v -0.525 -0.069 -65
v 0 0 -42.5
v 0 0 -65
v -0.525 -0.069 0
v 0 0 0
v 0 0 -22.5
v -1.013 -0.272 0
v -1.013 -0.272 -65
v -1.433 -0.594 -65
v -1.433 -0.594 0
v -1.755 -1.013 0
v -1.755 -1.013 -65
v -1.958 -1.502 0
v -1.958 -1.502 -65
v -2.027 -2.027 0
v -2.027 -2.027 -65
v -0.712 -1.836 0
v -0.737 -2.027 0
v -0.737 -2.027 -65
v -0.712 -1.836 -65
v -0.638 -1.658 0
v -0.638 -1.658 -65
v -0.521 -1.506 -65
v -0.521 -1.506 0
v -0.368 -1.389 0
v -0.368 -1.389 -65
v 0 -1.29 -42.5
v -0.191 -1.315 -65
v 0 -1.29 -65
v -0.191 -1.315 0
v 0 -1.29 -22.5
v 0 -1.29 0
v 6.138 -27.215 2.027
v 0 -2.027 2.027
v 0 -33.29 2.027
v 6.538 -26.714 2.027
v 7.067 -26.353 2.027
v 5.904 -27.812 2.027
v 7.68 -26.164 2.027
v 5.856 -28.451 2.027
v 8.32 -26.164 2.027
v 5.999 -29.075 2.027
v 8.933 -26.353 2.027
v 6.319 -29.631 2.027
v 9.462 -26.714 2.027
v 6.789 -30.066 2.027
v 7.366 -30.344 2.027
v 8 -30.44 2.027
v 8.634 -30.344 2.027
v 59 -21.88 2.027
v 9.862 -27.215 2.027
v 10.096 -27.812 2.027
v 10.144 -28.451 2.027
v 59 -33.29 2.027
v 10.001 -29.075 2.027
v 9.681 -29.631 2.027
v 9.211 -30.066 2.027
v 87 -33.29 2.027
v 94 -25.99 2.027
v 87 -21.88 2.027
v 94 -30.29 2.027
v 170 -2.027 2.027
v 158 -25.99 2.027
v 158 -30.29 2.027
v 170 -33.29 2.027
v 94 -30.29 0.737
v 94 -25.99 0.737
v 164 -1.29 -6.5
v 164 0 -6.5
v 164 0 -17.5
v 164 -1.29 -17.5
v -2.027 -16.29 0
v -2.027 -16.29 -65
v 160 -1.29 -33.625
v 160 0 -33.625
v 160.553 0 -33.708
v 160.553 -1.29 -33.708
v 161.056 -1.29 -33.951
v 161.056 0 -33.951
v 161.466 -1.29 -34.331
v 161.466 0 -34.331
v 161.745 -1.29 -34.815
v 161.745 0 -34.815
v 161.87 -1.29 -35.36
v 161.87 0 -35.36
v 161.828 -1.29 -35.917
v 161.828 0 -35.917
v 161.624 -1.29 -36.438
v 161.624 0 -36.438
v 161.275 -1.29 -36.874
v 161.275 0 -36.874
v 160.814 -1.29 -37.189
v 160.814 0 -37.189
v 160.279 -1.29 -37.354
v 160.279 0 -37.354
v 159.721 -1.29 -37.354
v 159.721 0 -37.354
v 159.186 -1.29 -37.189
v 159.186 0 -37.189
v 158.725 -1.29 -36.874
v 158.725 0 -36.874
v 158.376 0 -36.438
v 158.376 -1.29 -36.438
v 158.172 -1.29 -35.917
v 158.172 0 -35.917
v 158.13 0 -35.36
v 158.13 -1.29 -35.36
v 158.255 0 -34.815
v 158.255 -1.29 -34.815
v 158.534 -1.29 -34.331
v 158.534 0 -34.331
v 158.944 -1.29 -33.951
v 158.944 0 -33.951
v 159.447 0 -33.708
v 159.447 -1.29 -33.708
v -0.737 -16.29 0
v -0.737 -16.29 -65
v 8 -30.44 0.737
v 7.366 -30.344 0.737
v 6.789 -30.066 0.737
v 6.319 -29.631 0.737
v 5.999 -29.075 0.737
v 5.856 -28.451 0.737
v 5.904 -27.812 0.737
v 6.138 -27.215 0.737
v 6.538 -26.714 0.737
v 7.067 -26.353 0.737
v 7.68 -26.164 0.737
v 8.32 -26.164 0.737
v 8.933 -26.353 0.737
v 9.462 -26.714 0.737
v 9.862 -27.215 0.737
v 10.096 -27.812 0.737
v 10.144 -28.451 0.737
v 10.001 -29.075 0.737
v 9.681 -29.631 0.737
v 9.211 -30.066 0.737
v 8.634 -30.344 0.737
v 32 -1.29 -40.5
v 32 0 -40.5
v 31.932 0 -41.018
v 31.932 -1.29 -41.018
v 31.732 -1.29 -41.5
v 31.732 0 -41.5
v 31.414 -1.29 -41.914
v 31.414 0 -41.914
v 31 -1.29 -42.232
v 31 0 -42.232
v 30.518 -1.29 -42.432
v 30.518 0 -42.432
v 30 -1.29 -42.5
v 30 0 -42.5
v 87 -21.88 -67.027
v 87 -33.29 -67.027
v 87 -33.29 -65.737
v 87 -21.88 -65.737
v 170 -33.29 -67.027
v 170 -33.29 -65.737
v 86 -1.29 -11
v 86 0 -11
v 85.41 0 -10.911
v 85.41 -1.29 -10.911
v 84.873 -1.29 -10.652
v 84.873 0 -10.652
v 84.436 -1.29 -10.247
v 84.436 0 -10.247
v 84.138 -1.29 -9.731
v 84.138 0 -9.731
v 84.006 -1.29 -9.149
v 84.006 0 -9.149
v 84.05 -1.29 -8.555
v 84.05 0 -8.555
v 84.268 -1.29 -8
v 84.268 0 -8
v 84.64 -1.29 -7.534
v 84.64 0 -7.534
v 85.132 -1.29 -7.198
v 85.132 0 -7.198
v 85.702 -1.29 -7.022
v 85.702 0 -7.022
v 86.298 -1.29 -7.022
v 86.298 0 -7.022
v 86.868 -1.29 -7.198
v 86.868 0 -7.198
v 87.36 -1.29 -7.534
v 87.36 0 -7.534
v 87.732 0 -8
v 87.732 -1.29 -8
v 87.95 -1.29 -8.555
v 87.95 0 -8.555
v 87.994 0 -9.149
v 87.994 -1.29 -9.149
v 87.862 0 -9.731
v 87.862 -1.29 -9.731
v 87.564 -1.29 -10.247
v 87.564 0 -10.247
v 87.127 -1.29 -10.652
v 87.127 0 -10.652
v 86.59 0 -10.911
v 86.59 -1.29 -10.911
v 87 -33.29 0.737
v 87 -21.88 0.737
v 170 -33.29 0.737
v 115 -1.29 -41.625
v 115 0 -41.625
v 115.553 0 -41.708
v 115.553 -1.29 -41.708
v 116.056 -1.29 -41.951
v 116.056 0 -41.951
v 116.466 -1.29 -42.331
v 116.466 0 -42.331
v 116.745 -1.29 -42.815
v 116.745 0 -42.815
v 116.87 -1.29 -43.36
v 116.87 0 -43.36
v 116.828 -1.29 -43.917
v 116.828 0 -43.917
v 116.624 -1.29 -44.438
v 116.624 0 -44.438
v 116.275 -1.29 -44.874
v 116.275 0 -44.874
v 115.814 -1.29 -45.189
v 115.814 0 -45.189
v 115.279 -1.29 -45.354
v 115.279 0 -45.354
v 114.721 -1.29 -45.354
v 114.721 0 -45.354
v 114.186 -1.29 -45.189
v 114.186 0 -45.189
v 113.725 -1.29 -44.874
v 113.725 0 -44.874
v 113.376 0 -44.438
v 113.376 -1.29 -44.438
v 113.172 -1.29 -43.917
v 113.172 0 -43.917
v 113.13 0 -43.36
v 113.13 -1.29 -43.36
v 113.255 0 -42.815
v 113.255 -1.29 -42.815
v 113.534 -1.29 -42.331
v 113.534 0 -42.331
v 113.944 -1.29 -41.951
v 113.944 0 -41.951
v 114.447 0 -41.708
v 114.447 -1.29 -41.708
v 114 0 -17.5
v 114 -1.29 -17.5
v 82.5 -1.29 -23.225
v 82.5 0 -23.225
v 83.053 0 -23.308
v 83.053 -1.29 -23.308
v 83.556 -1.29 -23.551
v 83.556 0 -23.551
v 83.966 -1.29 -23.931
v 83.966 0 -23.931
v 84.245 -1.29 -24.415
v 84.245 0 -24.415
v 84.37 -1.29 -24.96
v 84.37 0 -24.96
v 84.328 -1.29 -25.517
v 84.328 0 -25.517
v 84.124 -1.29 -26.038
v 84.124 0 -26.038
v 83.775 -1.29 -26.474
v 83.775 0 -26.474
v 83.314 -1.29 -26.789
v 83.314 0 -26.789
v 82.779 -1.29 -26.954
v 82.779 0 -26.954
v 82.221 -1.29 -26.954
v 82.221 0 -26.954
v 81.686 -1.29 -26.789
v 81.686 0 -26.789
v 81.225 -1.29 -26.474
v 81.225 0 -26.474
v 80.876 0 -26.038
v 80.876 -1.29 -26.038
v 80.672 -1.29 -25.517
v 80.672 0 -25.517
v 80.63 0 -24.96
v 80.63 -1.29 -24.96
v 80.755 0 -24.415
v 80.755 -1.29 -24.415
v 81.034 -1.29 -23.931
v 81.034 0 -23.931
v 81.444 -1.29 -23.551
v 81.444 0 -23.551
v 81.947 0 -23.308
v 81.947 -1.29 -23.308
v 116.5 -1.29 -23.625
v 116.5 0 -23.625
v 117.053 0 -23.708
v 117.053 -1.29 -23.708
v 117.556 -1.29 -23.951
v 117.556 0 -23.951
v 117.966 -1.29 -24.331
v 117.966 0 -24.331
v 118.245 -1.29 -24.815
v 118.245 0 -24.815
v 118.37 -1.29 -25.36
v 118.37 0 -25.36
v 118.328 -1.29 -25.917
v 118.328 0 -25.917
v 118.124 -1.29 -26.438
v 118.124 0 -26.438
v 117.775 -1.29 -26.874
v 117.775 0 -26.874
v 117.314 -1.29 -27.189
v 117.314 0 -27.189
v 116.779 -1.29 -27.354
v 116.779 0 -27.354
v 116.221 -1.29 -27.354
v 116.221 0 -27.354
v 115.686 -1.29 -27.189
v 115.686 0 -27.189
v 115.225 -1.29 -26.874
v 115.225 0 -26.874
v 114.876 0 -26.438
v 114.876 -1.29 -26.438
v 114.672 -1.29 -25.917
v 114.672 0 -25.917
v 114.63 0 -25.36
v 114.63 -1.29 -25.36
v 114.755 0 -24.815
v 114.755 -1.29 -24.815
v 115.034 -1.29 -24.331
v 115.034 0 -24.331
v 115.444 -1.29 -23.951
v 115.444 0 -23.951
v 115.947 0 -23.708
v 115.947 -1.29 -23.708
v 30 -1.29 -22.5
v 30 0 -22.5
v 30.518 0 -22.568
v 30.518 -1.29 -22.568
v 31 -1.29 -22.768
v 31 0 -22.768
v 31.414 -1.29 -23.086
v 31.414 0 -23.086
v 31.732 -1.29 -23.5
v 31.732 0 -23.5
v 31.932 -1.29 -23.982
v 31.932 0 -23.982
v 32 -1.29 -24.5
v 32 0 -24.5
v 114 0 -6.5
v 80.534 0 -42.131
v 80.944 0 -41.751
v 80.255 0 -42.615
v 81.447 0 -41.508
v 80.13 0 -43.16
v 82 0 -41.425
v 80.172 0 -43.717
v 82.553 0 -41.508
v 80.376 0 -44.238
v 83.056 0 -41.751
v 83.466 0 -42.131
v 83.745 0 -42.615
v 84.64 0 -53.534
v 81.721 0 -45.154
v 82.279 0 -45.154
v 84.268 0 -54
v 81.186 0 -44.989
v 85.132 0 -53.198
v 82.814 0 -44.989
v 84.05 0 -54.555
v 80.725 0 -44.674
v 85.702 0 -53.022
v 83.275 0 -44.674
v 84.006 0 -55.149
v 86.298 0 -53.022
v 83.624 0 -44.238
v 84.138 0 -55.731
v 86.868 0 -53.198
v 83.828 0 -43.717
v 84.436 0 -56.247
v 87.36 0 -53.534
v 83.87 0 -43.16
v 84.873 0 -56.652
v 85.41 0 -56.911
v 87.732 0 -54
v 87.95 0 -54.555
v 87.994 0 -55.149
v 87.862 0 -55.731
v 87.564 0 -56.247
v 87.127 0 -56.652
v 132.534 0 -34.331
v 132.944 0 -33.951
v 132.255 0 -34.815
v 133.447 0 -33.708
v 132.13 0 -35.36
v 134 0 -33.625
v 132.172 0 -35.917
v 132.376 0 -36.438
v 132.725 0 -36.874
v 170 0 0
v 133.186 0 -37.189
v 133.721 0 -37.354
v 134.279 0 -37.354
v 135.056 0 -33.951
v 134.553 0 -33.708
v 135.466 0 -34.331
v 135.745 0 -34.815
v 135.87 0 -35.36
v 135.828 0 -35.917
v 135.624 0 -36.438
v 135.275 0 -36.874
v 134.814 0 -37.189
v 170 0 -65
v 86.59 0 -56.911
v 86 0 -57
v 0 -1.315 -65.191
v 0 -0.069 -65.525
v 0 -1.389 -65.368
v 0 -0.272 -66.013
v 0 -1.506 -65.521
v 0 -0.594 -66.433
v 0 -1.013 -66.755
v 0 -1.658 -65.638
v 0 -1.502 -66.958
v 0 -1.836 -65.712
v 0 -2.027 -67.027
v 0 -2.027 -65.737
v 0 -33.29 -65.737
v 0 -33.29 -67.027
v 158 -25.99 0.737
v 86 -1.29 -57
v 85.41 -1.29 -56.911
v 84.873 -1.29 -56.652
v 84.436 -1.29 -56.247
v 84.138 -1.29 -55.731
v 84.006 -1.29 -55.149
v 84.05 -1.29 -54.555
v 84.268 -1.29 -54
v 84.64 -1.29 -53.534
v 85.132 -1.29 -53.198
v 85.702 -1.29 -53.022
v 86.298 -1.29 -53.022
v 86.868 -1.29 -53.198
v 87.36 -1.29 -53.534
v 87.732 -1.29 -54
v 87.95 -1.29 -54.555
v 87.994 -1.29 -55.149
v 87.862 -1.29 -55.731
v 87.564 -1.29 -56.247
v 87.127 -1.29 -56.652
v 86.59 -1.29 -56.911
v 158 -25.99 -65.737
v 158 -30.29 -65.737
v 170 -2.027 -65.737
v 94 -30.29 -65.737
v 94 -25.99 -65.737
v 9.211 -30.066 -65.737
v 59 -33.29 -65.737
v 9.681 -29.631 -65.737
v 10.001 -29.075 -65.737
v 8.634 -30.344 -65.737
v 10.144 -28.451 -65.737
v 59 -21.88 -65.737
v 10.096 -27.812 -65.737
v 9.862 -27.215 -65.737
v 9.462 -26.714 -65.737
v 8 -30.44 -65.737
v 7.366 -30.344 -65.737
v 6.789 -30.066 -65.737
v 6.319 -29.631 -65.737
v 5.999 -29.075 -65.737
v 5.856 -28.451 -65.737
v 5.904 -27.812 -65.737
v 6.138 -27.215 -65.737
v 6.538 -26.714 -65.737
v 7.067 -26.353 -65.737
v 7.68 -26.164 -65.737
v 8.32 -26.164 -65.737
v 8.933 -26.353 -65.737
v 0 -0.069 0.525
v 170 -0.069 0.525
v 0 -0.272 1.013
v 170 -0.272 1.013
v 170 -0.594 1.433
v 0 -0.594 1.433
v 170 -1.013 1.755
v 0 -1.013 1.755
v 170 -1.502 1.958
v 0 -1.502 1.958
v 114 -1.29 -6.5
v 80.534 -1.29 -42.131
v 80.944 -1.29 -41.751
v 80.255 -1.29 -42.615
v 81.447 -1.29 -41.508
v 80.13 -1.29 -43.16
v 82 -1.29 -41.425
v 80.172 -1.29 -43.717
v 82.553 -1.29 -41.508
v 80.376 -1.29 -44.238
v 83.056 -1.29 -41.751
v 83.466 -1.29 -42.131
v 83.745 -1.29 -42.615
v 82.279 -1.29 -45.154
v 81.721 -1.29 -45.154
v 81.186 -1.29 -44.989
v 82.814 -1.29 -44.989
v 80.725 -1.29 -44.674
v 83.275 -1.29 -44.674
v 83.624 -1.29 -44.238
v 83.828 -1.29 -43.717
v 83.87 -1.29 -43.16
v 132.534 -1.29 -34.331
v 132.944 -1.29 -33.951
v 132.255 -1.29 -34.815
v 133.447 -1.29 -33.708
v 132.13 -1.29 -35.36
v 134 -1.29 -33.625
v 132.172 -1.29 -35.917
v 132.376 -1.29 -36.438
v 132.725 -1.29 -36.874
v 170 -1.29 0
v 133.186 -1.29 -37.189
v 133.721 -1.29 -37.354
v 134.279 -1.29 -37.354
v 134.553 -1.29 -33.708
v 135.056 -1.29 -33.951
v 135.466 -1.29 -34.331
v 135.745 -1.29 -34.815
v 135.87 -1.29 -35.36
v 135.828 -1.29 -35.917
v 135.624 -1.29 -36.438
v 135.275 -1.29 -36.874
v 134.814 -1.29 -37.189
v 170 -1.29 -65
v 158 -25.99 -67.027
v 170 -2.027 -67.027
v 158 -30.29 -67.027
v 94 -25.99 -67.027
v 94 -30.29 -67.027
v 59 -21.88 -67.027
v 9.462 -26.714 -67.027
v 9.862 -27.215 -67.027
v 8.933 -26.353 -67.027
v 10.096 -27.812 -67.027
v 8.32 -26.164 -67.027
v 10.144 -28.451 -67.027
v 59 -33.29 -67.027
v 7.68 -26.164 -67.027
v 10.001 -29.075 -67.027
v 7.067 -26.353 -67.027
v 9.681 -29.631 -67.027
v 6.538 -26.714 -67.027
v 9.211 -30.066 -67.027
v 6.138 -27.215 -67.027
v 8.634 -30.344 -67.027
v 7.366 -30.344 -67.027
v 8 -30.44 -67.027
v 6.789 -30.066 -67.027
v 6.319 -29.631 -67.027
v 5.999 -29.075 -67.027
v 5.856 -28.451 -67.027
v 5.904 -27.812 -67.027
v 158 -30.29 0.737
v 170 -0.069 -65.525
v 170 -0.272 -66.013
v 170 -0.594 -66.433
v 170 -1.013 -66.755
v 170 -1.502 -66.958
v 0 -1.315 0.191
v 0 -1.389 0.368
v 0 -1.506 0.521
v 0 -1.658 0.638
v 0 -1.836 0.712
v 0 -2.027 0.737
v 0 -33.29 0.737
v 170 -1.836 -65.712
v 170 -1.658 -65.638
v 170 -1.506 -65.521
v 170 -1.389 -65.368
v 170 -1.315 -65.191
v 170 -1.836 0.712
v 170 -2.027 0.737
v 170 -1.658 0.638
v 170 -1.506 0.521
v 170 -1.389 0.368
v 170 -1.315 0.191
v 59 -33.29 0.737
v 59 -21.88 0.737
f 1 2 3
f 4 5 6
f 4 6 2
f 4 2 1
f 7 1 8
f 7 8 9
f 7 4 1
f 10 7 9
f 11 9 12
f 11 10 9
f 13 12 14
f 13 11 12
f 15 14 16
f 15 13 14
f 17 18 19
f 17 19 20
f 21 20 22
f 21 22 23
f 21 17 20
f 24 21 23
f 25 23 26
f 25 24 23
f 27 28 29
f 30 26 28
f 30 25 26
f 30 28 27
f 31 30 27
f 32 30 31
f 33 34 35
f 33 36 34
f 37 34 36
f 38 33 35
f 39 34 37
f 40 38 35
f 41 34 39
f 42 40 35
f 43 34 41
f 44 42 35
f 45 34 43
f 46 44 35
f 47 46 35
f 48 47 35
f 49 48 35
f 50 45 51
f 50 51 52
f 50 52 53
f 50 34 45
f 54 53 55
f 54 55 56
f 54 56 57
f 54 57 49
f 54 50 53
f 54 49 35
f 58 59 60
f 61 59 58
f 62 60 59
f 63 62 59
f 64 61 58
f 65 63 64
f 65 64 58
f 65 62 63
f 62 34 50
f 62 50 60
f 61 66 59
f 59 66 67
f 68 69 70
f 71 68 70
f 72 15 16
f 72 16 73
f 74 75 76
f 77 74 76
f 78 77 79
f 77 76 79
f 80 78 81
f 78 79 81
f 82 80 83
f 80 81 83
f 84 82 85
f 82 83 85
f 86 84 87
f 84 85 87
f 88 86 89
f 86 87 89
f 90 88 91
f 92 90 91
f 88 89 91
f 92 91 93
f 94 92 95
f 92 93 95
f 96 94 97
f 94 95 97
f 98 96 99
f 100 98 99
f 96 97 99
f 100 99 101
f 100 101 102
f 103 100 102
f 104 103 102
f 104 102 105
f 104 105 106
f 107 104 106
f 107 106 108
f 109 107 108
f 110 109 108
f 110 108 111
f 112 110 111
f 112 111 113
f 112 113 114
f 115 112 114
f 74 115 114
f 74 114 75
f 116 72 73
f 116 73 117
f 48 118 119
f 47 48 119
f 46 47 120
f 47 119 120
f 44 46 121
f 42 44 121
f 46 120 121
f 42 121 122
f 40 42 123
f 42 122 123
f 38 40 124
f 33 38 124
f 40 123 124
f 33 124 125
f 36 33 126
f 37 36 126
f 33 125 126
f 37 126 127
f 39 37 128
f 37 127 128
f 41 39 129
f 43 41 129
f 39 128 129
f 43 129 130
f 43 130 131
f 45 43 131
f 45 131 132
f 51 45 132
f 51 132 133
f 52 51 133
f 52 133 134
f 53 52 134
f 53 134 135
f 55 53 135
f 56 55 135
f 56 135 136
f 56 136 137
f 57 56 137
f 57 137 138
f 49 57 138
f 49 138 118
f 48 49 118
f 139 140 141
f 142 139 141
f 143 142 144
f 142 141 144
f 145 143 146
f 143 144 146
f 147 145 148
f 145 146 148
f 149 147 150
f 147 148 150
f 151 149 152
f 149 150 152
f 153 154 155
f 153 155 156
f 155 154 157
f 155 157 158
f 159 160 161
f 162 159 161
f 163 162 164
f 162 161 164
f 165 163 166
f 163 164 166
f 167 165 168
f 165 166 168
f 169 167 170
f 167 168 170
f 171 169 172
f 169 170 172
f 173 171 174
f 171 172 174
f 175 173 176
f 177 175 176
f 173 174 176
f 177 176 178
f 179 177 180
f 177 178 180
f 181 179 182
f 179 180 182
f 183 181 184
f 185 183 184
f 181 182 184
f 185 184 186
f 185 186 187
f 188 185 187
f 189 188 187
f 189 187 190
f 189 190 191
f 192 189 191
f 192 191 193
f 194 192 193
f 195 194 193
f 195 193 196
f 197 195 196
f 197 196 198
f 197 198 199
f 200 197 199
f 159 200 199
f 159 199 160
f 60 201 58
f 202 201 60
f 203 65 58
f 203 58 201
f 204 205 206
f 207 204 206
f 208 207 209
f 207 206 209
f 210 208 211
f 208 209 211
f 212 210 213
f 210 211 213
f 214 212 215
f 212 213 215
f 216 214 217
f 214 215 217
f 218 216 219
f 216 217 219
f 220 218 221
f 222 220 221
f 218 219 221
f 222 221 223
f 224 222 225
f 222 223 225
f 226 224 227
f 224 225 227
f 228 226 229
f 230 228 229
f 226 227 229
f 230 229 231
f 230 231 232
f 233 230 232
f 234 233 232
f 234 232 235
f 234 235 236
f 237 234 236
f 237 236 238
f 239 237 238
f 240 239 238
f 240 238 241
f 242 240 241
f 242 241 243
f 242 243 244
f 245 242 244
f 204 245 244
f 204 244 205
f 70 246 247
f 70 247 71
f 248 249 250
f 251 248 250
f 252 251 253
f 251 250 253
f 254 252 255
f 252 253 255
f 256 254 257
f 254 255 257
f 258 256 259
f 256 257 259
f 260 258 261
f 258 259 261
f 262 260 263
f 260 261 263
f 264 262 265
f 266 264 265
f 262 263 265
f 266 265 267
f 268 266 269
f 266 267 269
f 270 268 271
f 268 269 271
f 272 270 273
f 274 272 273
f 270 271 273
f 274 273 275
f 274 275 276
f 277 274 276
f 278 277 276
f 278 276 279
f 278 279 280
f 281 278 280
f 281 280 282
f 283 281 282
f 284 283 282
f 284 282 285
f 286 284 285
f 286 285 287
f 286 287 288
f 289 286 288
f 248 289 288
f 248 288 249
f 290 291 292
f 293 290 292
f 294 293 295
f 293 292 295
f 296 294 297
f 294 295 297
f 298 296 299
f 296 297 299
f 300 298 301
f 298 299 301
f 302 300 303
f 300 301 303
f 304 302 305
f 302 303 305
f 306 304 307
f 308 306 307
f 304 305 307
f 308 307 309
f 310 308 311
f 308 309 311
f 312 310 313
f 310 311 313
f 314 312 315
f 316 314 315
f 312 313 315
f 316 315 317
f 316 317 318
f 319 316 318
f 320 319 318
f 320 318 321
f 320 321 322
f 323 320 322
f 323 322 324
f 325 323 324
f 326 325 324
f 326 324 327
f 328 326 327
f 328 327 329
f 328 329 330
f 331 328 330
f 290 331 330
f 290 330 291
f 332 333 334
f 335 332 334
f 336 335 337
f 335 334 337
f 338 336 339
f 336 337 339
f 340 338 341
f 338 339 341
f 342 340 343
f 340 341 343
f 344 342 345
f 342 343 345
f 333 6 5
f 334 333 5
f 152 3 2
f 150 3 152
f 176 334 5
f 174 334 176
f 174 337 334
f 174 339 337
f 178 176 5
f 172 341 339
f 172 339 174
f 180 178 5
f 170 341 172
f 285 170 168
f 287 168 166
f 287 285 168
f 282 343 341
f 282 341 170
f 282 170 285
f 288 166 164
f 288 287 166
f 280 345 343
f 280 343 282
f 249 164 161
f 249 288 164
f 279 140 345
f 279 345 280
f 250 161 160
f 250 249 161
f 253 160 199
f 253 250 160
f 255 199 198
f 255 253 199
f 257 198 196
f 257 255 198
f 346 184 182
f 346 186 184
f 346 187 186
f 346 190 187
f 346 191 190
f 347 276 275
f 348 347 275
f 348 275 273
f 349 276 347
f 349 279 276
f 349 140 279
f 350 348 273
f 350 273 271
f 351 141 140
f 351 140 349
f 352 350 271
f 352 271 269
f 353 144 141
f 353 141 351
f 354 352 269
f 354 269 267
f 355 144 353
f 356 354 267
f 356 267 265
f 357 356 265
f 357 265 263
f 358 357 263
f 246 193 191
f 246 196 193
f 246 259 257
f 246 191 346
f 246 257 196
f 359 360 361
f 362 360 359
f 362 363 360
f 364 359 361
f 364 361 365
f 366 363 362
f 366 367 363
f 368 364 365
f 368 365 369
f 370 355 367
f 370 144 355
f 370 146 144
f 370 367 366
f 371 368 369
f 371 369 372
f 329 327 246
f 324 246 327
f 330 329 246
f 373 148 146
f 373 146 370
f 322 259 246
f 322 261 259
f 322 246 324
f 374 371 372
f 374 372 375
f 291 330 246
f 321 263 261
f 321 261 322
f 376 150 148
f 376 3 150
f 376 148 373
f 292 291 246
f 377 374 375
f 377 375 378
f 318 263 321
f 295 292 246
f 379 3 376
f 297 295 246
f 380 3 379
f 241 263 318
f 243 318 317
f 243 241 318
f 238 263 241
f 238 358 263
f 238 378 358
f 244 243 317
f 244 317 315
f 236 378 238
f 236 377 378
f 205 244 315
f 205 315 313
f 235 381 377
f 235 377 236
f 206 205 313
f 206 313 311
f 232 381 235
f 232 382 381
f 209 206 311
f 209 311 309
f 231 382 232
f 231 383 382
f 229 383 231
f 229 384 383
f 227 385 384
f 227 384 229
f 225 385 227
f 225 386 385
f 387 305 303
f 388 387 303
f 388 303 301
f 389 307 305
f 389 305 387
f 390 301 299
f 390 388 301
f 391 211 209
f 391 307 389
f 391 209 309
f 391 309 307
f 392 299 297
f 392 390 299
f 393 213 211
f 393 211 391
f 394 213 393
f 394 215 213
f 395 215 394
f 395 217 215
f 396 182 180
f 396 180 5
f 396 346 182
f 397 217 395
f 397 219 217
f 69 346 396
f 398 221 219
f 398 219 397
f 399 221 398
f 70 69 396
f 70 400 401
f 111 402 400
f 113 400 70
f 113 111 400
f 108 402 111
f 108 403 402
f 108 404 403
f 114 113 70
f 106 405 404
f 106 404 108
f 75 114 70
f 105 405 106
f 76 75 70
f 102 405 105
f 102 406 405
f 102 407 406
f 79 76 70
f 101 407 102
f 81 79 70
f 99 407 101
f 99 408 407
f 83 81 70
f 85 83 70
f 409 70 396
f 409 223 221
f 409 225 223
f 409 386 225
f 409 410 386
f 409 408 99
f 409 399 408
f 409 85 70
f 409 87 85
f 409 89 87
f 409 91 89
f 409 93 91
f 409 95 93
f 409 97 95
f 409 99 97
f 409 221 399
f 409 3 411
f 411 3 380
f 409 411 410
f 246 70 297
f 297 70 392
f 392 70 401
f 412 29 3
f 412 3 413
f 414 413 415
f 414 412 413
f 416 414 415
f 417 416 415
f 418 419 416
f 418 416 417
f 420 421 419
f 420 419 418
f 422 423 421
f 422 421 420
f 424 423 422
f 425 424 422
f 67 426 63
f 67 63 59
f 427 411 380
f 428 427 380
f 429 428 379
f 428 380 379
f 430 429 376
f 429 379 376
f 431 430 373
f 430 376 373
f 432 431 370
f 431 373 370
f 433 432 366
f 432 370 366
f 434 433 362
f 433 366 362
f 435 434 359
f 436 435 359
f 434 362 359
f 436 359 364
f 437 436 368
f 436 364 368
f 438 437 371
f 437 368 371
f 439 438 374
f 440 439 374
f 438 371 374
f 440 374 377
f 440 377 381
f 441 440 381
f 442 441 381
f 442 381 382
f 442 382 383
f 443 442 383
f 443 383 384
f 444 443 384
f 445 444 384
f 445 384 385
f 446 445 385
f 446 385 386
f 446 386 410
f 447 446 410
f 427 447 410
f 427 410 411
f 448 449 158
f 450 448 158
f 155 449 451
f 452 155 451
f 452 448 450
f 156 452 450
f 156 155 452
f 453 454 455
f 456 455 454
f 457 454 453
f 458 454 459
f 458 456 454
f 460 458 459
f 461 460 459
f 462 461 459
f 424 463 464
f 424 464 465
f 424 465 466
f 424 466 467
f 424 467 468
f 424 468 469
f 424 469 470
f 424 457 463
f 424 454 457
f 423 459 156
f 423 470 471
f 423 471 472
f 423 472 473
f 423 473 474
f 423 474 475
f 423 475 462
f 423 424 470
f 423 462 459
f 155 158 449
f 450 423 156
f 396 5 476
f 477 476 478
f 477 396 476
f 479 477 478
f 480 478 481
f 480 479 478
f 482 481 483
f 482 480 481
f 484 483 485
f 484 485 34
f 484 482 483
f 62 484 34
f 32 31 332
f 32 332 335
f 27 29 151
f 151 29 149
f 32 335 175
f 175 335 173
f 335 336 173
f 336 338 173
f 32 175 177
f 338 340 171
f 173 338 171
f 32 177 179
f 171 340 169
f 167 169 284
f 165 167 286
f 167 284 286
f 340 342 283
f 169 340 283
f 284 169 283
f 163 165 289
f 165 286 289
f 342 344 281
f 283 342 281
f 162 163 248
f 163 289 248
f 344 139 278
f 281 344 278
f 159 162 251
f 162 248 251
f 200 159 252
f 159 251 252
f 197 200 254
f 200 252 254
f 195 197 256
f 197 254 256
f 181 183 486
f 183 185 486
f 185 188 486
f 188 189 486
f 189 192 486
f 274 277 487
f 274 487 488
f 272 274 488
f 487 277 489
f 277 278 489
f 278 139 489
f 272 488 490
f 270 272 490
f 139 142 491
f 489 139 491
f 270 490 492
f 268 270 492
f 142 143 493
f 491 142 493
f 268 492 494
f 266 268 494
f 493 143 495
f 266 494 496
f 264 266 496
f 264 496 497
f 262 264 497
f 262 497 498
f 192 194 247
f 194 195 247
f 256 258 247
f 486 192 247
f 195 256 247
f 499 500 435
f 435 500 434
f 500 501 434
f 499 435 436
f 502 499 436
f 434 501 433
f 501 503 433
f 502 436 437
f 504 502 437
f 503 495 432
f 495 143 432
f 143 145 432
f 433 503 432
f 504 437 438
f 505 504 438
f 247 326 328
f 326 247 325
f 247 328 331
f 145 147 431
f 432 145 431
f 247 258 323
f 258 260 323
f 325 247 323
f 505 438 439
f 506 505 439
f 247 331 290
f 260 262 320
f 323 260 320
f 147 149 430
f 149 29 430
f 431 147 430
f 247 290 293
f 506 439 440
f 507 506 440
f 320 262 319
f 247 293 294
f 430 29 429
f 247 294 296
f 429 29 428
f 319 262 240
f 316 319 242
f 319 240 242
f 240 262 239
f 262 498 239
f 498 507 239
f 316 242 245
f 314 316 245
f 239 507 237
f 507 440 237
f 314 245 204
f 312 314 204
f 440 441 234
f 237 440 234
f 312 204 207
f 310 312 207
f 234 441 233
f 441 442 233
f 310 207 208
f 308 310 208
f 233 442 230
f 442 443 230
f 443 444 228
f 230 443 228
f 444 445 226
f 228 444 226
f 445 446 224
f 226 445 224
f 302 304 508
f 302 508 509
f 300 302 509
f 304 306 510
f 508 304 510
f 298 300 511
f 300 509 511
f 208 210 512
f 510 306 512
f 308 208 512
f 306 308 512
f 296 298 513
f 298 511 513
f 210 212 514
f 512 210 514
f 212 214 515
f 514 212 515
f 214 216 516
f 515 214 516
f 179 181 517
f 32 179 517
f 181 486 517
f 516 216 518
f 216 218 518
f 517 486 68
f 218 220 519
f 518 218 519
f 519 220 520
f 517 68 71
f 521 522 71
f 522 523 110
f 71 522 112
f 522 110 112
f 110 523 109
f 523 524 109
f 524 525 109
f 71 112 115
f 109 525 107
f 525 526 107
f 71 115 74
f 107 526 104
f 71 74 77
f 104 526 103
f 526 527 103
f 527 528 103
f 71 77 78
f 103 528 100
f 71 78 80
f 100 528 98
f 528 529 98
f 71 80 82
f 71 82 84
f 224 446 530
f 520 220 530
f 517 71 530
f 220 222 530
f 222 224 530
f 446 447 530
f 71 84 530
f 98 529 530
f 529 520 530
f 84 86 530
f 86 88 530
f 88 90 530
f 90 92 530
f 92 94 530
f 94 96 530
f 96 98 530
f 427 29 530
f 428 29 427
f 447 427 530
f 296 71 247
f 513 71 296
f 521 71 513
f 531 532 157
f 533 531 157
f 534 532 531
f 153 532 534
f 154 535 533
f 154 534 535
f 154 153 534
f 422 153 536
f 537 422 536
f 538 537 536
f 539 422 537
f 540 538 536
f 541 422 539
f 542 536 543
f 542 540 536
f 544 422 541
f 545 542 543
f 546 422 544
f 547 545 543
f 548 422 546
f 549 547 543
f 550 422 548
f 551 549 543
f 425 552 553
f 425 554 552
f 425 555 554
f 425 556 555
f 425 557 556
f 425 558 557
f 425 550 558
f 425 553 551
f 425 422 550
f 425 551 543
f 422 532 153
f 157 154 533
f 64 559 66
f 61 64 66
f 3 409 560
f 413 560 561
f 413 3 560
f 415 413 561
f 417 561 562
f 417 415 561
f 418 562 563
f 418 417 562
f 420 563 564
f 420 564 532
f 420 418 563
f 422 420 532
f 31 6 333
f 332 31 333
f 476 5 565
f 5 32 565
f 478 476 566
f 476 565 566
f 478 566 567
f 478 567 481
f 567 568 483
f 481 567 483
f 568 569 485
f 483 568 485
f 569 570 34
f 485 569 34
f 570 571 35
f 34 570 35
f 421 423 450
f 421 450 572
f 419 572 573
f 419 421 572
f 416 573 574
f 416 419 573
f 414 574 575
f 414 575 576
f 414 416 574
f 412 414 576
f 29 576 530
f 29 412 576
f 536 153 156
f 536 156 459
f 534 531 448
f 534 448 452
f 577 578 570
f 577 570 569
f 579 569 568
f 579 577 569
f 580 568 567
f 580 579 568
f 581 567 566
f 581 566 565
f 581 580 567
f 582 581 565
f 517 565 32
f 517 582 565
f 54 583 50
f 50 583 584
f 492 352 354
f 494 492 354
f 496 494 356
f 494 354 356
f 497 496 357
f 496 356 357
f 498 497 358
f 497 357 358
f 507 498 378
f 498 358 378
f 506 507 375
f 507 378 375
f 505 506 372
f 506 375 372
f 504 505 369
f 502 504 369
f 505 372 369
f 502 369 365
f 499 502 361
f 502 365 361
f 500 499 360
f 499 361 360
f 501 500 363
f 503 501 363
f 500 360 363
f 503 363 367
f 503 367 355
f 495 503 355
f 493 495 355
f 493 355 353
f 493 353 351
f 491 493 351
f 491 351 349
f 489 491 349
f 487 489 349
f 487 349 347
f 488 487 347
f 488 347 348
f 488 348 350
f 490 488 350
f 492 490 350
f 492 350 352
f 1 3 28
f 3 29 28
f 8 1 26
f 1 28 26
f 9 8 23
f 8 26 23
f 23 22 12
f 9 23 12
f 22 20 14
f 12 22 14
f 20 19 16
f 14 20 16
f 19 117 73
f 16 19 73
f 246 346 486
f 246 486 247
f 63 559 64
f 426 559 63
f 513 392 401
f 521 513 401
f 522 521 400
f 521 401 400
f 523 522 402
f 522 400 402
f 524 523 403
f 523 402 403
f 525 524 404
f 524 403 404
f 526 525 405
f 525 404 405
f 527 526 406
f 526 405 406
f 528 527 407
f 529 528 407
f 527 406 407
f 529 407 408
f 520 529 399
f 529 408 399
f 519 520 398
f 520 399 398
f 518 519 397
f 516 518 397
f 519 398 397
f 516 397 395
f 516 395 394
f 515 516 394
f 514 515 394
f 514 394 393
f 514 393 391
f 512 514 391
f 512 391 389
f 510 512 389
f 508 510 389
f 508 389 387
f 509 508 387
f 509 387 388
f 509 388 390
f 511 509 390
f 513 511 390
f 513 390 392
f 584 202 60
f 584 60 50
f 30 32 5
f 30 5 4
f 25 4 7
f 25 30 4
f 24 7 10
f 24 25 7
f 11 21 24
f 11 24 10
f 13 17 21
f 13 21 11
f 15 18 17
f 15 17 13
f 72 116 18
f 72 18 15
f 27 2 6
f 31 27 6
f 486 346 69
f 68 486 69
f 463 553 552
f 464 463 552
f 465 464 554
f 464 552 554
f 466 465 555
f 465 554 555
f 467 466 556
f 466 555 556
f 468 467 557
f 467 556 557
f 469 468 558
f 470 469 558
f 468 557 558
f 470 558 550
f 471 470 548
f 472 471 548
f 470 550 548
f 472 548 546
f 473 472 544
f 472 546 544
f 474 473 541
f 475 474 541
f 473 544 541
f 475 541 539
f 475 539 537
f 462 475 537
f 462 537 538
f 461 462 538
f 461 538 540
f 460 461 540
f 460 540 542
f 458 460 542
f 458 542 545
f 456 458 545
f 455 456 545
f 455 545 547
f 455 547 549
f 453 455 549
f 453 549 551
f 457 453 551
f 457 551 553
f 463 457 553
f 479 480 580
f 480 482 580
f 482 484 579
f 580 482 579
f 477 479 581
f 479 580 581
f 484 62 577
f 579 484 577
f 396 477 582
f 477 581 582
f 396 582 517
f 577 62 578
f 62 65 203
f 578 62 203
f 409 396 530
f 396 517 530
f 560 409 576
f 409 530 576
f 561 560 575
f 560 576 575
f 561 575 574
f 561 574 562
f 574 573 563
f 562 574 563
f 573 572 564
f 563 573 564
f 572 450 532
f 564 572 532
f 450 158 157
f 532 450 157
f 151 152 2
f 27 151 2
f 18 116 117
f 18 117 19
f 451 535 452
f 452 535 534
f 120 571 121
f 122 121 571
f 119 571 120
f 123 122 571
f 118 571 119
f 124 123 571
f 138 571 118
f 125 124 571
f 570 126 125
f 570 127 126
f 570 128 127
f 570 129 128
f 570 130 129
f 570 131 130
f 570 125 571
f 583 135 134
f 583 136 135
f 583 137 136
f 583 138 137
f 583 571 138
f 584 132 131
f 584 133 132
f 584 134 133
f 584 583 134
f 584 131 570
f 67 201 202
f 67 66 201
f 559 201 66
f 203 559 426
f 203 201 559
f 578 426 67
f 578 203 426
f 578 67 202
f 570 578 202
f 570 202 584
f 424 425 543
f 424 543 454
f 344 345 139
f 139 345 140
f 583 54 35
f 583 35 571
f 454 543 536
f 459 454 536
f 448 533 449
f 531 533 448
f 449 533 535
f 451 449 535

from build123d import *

# Parameters (mm, degrees)
SKETCH1_W          = 170
SKETCH1_H          = 65
BASE_FLANGE1_DEPTH = 1.29
EDGE_FLANGE1_DEPTH = 170
EDGE_FLANGE3_DEPTH = 65
CUT_EXTRUDE1_REACH = 187.022
SKETCH16_R         = 2
SKETCH16_W         = 50
SKETCH16_H         = 11
EDGE_FLANGE7_DEPTH = 170
SKETCH34_R         = 2.15
SKETCH34_W         = 28
SKETCH34_H         = 11.41
SKETCH34_W_2       = 64
SKETCH34_H_2       = 4.3
CUT_EXTRUDE5_DEPTH = 187.484767556
SKETCH36_R         = 1.875
CUT_EXTRUDE6_DEPTH = 10
SKETCH37_R         = 1.875
CUT_EXTRUDE7_DEPTH = 10


# Sheet-metal steps are written as plain solids
with BuildPart() as part:
    # Sketch1 → Base-Flange1 (new body)
    with BuildSketch(Plane(origin=(0, 0, 0), x_dir=(1, 0, 0), z_dir=(0, 1, 0))):
        with Locations((85, 32.5)):
            Rectangle(SKETCH1_W, SKETCH1_H)
    extrude(amount=-BASE_FLANGE1_DEPTH)

    # Edge-Flange1 section (across the edge) → Edge-Flange1 (add)
    with BuildSketch(Plane(origin=(170, -1.29, 0.7366), x_dir=(0, 0, -1), z_dir=(-1, 0, 0))):
        with BuildLine():
            Line((-1.29, 0.7366), (-1.29, 32))
            Line((-1.29, 32), (0, 32))
            Line((0, 32), (0, 0.7366))
            ThreePointArc((0, 0.7366), (0.215745145, 0.215745145), (0.7366, 0))
            Line((0.7366, 0), (0.7366, -1.29))
            ThreePointArc((0.7366, -1.29), (-0.696422603, -0.696422603), (-1.29, 0.7366))
        make_face()
    extrude(amount=EDGE_FLANGE1_DEPTH)

    # Edge-Flange3 section (across the edge) → Edge-Flange3 (add)
    with BuildSketch(Plane(origin=(-0.7366, -1.29, 0), x_dir=(1, 0, 0), z_dir=(0, 0, -1))):
        with BuildLine():
            Line((-1.29, 0.7366), (-1.29, 15))
            Line((-1.29, 15), (0, 15))
            Line((0, 15), (0, 0.7366))
            ThreePointArc((0, 0.7366), (0.215745145, 0.215745145), (0.7366, 0))
            Line((0.7366, 0), (0.7366, -1.29))
            ThreePointArc((0.7366, -1.29), (-0.696422603, -0.696422603), (-1.29, 0.7366))
        make_face()
    extrude(amount=EDGE_FLANGE3_DEPTH)

    # Sketch16 → Cut-Extrude1 (cut, up to next)
    with BuildSketch(Plane(origin=(0, 0, 0), x_dir=(1, 0, 0), z_dir=(0, 1, 0)), mode=Mode.PRIVATE) as cut_extrude1_sk1:
        with Locations(Location((86, 9, 0), (0, 0, 90))):
            Circle(SKETCH16_R)
    cut_extrude1_tool1 = extrude(cut_extrude1_sk1.sketch, amount=-CUT_EXTRUDE1_REACH, mode=Mode.PRIVATE) & part.part
    # Sketch16 → Cut-Extrude1 (cut, up to next)
    with BuildSketch(Plane(origin=(0, 0, 0), x_dir=(1, 0, 0), z_dir=(0, 1, 0)), mode=Mode.PRIVATE) as cut_extrude1_sk2:
        with Locations(Location((86, 55, 0), (0, 0, 90))):
            Circle(SKETCH16_R)
    cut_extrude1_tool2 = extrude(cut_extrude1_sk2.sketch, amount=-CUT_EXTRUDE1_REACH, mode=Mode.PRIVATE) & part.part
    # Sketch16 → Cut-Extrude1 (cut, up to next)
    with BuildSketch(Plane(origin=(0, 0, 0), x_dir=(1, 0, 0), z_dir=(0, 1, 0)), mode=Mode.PRIVATE) as cut_extrude1_sk3:
        with Locations((139, 12)):
            Rectangle(SKETCH16_W, SKETCH16_H)
    cut_extrude1_tool3 = extrude(cut_extrude1_sk3.sketch, amount=-CUT_EXTRUDE1_REACH, mode=Mode.PRIVATE) & part.part
    # Sketch16 → Cut-Extrude1 (cut, up to next)
    with BuildSketch(Plane(origin=(0, 0, 0), x_dir=(1, 0, 0), z_dir=(0, 1, 0)), mode=Mode.PRIVATE) as cut_extrude1_sk4:
        with BuildLine():
            Line((30, 42.5), (0, 42.5))
            Line((0, 42.5), (0, 22.5))
            Line((0, 22.5), (30, 22.5))
            ThreePointArc((30, 22.5), (31.414213562, 23.085786438), (32, 24.5))
            Line((32, 24.5), (32, 40.5))
            ThreePointArc((32, 40.5), (31.414213562, 41.914213562), (30, 42.5))
        make_face()
    cut_extrude1_tool4 = extrude(cut_extrude1_sk4.sketch, amount=-CUT_EXTRUDE1_REACH, mode=Mode.PRIVATE) & part.part
    add(cut_extrude1_tool1.solids().sort_by_distance((86, 0, -9))[0], mode=Mode.SUBTRACT)
    add(cut_extrude1_tool2.solids().sort_by_distance((86, 0, -55))[0], mode=Mode.SUBTRACT)
    add(cut_extrude1_tool3.solids().sort_by_distance((139, 0, -12))[0], mode=Mode.SUBTRACT)
    add(cut_extrude1_tool4.solids().sort_by_distance((15.958166, 0, -32.5))[0], mode=Mode.SUBTRACT)

    # Edge-Flange7 section (across the edge) → Edge-Flange7 (add)
    with BuildSketch(Plane(origin=(0, -1.29, -65.7366), x_dir=(0, 0, 1), z_dir=(1, 0, 0))):
        with BuildLine():
            Line((-1.29, 0.7366), (-1.29, 32))
            Line((-1.29, 32), (0, 32))
            Line((0, 32), (0, 0.7366))
            ThreePointArc((0, 0.7366), (0.215745145, 0.215745145), (0.7366, 0))
            Line((0.7366, 0), (0.7366, -1.29))
            ThreePointArc((0.7366, -1.29), (-0.696422603, -0.696422603), (-1.29, 0.7366))
        make_face()
    extrude(amount=EDGE_FLANGE7_DEPTH)

    # Sketch34 → Cut-Extrude5 (cut, through all)
    with BuildSketch(Plane(origin=(0, 0, -67.0266), x_dir=(-1, 0, 0), z_dir=(0, 0, -1))):
        with Locations(Location((-8, -28.29, 0), (0, 0, 270))):
            Circle(SKETCH34_R)
        with Locations((-73, -27.585)):
            Rectangle(SKETCH34_W, SKETCH34_H)
        with Locations((-126, -28.14)):
            Rectangle(SKETCH34_W_2, SKETCH34_H_2)
    extrude(amount=-CUT_EXTRUDE5_DEPTH, mode=Mode.SUBTRACT)

    # Sketch36 → Cut-Extrude6 (cut)
    with BuildSketch(Plane(origin=(0, 0, 0), x_dir=(1, 0, 0), z_dir=(0, 1, 0))):
        with Locations(Location((116.5, 25.5, 0), (0, 0, 270))):
            Circle(SKETCH36_R)
        with Locations(Location((115, 43.5, 0), (0, 0, 270))):
            Circle(SKETCH36_R)
        with Locations(Location((82.5, 25.1, 0), (0, 0, 270))):
            Circle(SKETCH36_R)
        with Locations(Location((82, 43.3, 0), (0, 0, 270))):
            Circle(SKETCH36_R)
    extrude(amount=-CUT_EXTRUDE6_DEPTH, mode=Mode.SUBTRACT)

    # Sketch37 → Cut-Extrude7 (cut)
    with BuildSketch(Plane(origin=(0, 0, 0), x_dir=(1, 0, 0), z_dir=(0, 1, 0))):
        with Locations(Location((160, 35.5, 0), (0, 0, 270))):
            Circle(SKETCH37_R)
        with Locations(Location((134, 35.5, 0), (0, 0, 270))):
            Circle(SKETCH37_R)
    extrude(amount=-CUT_EXTRUDE7_DEPTH, mode=Mode.SUBTRACT)


solid = part.part
